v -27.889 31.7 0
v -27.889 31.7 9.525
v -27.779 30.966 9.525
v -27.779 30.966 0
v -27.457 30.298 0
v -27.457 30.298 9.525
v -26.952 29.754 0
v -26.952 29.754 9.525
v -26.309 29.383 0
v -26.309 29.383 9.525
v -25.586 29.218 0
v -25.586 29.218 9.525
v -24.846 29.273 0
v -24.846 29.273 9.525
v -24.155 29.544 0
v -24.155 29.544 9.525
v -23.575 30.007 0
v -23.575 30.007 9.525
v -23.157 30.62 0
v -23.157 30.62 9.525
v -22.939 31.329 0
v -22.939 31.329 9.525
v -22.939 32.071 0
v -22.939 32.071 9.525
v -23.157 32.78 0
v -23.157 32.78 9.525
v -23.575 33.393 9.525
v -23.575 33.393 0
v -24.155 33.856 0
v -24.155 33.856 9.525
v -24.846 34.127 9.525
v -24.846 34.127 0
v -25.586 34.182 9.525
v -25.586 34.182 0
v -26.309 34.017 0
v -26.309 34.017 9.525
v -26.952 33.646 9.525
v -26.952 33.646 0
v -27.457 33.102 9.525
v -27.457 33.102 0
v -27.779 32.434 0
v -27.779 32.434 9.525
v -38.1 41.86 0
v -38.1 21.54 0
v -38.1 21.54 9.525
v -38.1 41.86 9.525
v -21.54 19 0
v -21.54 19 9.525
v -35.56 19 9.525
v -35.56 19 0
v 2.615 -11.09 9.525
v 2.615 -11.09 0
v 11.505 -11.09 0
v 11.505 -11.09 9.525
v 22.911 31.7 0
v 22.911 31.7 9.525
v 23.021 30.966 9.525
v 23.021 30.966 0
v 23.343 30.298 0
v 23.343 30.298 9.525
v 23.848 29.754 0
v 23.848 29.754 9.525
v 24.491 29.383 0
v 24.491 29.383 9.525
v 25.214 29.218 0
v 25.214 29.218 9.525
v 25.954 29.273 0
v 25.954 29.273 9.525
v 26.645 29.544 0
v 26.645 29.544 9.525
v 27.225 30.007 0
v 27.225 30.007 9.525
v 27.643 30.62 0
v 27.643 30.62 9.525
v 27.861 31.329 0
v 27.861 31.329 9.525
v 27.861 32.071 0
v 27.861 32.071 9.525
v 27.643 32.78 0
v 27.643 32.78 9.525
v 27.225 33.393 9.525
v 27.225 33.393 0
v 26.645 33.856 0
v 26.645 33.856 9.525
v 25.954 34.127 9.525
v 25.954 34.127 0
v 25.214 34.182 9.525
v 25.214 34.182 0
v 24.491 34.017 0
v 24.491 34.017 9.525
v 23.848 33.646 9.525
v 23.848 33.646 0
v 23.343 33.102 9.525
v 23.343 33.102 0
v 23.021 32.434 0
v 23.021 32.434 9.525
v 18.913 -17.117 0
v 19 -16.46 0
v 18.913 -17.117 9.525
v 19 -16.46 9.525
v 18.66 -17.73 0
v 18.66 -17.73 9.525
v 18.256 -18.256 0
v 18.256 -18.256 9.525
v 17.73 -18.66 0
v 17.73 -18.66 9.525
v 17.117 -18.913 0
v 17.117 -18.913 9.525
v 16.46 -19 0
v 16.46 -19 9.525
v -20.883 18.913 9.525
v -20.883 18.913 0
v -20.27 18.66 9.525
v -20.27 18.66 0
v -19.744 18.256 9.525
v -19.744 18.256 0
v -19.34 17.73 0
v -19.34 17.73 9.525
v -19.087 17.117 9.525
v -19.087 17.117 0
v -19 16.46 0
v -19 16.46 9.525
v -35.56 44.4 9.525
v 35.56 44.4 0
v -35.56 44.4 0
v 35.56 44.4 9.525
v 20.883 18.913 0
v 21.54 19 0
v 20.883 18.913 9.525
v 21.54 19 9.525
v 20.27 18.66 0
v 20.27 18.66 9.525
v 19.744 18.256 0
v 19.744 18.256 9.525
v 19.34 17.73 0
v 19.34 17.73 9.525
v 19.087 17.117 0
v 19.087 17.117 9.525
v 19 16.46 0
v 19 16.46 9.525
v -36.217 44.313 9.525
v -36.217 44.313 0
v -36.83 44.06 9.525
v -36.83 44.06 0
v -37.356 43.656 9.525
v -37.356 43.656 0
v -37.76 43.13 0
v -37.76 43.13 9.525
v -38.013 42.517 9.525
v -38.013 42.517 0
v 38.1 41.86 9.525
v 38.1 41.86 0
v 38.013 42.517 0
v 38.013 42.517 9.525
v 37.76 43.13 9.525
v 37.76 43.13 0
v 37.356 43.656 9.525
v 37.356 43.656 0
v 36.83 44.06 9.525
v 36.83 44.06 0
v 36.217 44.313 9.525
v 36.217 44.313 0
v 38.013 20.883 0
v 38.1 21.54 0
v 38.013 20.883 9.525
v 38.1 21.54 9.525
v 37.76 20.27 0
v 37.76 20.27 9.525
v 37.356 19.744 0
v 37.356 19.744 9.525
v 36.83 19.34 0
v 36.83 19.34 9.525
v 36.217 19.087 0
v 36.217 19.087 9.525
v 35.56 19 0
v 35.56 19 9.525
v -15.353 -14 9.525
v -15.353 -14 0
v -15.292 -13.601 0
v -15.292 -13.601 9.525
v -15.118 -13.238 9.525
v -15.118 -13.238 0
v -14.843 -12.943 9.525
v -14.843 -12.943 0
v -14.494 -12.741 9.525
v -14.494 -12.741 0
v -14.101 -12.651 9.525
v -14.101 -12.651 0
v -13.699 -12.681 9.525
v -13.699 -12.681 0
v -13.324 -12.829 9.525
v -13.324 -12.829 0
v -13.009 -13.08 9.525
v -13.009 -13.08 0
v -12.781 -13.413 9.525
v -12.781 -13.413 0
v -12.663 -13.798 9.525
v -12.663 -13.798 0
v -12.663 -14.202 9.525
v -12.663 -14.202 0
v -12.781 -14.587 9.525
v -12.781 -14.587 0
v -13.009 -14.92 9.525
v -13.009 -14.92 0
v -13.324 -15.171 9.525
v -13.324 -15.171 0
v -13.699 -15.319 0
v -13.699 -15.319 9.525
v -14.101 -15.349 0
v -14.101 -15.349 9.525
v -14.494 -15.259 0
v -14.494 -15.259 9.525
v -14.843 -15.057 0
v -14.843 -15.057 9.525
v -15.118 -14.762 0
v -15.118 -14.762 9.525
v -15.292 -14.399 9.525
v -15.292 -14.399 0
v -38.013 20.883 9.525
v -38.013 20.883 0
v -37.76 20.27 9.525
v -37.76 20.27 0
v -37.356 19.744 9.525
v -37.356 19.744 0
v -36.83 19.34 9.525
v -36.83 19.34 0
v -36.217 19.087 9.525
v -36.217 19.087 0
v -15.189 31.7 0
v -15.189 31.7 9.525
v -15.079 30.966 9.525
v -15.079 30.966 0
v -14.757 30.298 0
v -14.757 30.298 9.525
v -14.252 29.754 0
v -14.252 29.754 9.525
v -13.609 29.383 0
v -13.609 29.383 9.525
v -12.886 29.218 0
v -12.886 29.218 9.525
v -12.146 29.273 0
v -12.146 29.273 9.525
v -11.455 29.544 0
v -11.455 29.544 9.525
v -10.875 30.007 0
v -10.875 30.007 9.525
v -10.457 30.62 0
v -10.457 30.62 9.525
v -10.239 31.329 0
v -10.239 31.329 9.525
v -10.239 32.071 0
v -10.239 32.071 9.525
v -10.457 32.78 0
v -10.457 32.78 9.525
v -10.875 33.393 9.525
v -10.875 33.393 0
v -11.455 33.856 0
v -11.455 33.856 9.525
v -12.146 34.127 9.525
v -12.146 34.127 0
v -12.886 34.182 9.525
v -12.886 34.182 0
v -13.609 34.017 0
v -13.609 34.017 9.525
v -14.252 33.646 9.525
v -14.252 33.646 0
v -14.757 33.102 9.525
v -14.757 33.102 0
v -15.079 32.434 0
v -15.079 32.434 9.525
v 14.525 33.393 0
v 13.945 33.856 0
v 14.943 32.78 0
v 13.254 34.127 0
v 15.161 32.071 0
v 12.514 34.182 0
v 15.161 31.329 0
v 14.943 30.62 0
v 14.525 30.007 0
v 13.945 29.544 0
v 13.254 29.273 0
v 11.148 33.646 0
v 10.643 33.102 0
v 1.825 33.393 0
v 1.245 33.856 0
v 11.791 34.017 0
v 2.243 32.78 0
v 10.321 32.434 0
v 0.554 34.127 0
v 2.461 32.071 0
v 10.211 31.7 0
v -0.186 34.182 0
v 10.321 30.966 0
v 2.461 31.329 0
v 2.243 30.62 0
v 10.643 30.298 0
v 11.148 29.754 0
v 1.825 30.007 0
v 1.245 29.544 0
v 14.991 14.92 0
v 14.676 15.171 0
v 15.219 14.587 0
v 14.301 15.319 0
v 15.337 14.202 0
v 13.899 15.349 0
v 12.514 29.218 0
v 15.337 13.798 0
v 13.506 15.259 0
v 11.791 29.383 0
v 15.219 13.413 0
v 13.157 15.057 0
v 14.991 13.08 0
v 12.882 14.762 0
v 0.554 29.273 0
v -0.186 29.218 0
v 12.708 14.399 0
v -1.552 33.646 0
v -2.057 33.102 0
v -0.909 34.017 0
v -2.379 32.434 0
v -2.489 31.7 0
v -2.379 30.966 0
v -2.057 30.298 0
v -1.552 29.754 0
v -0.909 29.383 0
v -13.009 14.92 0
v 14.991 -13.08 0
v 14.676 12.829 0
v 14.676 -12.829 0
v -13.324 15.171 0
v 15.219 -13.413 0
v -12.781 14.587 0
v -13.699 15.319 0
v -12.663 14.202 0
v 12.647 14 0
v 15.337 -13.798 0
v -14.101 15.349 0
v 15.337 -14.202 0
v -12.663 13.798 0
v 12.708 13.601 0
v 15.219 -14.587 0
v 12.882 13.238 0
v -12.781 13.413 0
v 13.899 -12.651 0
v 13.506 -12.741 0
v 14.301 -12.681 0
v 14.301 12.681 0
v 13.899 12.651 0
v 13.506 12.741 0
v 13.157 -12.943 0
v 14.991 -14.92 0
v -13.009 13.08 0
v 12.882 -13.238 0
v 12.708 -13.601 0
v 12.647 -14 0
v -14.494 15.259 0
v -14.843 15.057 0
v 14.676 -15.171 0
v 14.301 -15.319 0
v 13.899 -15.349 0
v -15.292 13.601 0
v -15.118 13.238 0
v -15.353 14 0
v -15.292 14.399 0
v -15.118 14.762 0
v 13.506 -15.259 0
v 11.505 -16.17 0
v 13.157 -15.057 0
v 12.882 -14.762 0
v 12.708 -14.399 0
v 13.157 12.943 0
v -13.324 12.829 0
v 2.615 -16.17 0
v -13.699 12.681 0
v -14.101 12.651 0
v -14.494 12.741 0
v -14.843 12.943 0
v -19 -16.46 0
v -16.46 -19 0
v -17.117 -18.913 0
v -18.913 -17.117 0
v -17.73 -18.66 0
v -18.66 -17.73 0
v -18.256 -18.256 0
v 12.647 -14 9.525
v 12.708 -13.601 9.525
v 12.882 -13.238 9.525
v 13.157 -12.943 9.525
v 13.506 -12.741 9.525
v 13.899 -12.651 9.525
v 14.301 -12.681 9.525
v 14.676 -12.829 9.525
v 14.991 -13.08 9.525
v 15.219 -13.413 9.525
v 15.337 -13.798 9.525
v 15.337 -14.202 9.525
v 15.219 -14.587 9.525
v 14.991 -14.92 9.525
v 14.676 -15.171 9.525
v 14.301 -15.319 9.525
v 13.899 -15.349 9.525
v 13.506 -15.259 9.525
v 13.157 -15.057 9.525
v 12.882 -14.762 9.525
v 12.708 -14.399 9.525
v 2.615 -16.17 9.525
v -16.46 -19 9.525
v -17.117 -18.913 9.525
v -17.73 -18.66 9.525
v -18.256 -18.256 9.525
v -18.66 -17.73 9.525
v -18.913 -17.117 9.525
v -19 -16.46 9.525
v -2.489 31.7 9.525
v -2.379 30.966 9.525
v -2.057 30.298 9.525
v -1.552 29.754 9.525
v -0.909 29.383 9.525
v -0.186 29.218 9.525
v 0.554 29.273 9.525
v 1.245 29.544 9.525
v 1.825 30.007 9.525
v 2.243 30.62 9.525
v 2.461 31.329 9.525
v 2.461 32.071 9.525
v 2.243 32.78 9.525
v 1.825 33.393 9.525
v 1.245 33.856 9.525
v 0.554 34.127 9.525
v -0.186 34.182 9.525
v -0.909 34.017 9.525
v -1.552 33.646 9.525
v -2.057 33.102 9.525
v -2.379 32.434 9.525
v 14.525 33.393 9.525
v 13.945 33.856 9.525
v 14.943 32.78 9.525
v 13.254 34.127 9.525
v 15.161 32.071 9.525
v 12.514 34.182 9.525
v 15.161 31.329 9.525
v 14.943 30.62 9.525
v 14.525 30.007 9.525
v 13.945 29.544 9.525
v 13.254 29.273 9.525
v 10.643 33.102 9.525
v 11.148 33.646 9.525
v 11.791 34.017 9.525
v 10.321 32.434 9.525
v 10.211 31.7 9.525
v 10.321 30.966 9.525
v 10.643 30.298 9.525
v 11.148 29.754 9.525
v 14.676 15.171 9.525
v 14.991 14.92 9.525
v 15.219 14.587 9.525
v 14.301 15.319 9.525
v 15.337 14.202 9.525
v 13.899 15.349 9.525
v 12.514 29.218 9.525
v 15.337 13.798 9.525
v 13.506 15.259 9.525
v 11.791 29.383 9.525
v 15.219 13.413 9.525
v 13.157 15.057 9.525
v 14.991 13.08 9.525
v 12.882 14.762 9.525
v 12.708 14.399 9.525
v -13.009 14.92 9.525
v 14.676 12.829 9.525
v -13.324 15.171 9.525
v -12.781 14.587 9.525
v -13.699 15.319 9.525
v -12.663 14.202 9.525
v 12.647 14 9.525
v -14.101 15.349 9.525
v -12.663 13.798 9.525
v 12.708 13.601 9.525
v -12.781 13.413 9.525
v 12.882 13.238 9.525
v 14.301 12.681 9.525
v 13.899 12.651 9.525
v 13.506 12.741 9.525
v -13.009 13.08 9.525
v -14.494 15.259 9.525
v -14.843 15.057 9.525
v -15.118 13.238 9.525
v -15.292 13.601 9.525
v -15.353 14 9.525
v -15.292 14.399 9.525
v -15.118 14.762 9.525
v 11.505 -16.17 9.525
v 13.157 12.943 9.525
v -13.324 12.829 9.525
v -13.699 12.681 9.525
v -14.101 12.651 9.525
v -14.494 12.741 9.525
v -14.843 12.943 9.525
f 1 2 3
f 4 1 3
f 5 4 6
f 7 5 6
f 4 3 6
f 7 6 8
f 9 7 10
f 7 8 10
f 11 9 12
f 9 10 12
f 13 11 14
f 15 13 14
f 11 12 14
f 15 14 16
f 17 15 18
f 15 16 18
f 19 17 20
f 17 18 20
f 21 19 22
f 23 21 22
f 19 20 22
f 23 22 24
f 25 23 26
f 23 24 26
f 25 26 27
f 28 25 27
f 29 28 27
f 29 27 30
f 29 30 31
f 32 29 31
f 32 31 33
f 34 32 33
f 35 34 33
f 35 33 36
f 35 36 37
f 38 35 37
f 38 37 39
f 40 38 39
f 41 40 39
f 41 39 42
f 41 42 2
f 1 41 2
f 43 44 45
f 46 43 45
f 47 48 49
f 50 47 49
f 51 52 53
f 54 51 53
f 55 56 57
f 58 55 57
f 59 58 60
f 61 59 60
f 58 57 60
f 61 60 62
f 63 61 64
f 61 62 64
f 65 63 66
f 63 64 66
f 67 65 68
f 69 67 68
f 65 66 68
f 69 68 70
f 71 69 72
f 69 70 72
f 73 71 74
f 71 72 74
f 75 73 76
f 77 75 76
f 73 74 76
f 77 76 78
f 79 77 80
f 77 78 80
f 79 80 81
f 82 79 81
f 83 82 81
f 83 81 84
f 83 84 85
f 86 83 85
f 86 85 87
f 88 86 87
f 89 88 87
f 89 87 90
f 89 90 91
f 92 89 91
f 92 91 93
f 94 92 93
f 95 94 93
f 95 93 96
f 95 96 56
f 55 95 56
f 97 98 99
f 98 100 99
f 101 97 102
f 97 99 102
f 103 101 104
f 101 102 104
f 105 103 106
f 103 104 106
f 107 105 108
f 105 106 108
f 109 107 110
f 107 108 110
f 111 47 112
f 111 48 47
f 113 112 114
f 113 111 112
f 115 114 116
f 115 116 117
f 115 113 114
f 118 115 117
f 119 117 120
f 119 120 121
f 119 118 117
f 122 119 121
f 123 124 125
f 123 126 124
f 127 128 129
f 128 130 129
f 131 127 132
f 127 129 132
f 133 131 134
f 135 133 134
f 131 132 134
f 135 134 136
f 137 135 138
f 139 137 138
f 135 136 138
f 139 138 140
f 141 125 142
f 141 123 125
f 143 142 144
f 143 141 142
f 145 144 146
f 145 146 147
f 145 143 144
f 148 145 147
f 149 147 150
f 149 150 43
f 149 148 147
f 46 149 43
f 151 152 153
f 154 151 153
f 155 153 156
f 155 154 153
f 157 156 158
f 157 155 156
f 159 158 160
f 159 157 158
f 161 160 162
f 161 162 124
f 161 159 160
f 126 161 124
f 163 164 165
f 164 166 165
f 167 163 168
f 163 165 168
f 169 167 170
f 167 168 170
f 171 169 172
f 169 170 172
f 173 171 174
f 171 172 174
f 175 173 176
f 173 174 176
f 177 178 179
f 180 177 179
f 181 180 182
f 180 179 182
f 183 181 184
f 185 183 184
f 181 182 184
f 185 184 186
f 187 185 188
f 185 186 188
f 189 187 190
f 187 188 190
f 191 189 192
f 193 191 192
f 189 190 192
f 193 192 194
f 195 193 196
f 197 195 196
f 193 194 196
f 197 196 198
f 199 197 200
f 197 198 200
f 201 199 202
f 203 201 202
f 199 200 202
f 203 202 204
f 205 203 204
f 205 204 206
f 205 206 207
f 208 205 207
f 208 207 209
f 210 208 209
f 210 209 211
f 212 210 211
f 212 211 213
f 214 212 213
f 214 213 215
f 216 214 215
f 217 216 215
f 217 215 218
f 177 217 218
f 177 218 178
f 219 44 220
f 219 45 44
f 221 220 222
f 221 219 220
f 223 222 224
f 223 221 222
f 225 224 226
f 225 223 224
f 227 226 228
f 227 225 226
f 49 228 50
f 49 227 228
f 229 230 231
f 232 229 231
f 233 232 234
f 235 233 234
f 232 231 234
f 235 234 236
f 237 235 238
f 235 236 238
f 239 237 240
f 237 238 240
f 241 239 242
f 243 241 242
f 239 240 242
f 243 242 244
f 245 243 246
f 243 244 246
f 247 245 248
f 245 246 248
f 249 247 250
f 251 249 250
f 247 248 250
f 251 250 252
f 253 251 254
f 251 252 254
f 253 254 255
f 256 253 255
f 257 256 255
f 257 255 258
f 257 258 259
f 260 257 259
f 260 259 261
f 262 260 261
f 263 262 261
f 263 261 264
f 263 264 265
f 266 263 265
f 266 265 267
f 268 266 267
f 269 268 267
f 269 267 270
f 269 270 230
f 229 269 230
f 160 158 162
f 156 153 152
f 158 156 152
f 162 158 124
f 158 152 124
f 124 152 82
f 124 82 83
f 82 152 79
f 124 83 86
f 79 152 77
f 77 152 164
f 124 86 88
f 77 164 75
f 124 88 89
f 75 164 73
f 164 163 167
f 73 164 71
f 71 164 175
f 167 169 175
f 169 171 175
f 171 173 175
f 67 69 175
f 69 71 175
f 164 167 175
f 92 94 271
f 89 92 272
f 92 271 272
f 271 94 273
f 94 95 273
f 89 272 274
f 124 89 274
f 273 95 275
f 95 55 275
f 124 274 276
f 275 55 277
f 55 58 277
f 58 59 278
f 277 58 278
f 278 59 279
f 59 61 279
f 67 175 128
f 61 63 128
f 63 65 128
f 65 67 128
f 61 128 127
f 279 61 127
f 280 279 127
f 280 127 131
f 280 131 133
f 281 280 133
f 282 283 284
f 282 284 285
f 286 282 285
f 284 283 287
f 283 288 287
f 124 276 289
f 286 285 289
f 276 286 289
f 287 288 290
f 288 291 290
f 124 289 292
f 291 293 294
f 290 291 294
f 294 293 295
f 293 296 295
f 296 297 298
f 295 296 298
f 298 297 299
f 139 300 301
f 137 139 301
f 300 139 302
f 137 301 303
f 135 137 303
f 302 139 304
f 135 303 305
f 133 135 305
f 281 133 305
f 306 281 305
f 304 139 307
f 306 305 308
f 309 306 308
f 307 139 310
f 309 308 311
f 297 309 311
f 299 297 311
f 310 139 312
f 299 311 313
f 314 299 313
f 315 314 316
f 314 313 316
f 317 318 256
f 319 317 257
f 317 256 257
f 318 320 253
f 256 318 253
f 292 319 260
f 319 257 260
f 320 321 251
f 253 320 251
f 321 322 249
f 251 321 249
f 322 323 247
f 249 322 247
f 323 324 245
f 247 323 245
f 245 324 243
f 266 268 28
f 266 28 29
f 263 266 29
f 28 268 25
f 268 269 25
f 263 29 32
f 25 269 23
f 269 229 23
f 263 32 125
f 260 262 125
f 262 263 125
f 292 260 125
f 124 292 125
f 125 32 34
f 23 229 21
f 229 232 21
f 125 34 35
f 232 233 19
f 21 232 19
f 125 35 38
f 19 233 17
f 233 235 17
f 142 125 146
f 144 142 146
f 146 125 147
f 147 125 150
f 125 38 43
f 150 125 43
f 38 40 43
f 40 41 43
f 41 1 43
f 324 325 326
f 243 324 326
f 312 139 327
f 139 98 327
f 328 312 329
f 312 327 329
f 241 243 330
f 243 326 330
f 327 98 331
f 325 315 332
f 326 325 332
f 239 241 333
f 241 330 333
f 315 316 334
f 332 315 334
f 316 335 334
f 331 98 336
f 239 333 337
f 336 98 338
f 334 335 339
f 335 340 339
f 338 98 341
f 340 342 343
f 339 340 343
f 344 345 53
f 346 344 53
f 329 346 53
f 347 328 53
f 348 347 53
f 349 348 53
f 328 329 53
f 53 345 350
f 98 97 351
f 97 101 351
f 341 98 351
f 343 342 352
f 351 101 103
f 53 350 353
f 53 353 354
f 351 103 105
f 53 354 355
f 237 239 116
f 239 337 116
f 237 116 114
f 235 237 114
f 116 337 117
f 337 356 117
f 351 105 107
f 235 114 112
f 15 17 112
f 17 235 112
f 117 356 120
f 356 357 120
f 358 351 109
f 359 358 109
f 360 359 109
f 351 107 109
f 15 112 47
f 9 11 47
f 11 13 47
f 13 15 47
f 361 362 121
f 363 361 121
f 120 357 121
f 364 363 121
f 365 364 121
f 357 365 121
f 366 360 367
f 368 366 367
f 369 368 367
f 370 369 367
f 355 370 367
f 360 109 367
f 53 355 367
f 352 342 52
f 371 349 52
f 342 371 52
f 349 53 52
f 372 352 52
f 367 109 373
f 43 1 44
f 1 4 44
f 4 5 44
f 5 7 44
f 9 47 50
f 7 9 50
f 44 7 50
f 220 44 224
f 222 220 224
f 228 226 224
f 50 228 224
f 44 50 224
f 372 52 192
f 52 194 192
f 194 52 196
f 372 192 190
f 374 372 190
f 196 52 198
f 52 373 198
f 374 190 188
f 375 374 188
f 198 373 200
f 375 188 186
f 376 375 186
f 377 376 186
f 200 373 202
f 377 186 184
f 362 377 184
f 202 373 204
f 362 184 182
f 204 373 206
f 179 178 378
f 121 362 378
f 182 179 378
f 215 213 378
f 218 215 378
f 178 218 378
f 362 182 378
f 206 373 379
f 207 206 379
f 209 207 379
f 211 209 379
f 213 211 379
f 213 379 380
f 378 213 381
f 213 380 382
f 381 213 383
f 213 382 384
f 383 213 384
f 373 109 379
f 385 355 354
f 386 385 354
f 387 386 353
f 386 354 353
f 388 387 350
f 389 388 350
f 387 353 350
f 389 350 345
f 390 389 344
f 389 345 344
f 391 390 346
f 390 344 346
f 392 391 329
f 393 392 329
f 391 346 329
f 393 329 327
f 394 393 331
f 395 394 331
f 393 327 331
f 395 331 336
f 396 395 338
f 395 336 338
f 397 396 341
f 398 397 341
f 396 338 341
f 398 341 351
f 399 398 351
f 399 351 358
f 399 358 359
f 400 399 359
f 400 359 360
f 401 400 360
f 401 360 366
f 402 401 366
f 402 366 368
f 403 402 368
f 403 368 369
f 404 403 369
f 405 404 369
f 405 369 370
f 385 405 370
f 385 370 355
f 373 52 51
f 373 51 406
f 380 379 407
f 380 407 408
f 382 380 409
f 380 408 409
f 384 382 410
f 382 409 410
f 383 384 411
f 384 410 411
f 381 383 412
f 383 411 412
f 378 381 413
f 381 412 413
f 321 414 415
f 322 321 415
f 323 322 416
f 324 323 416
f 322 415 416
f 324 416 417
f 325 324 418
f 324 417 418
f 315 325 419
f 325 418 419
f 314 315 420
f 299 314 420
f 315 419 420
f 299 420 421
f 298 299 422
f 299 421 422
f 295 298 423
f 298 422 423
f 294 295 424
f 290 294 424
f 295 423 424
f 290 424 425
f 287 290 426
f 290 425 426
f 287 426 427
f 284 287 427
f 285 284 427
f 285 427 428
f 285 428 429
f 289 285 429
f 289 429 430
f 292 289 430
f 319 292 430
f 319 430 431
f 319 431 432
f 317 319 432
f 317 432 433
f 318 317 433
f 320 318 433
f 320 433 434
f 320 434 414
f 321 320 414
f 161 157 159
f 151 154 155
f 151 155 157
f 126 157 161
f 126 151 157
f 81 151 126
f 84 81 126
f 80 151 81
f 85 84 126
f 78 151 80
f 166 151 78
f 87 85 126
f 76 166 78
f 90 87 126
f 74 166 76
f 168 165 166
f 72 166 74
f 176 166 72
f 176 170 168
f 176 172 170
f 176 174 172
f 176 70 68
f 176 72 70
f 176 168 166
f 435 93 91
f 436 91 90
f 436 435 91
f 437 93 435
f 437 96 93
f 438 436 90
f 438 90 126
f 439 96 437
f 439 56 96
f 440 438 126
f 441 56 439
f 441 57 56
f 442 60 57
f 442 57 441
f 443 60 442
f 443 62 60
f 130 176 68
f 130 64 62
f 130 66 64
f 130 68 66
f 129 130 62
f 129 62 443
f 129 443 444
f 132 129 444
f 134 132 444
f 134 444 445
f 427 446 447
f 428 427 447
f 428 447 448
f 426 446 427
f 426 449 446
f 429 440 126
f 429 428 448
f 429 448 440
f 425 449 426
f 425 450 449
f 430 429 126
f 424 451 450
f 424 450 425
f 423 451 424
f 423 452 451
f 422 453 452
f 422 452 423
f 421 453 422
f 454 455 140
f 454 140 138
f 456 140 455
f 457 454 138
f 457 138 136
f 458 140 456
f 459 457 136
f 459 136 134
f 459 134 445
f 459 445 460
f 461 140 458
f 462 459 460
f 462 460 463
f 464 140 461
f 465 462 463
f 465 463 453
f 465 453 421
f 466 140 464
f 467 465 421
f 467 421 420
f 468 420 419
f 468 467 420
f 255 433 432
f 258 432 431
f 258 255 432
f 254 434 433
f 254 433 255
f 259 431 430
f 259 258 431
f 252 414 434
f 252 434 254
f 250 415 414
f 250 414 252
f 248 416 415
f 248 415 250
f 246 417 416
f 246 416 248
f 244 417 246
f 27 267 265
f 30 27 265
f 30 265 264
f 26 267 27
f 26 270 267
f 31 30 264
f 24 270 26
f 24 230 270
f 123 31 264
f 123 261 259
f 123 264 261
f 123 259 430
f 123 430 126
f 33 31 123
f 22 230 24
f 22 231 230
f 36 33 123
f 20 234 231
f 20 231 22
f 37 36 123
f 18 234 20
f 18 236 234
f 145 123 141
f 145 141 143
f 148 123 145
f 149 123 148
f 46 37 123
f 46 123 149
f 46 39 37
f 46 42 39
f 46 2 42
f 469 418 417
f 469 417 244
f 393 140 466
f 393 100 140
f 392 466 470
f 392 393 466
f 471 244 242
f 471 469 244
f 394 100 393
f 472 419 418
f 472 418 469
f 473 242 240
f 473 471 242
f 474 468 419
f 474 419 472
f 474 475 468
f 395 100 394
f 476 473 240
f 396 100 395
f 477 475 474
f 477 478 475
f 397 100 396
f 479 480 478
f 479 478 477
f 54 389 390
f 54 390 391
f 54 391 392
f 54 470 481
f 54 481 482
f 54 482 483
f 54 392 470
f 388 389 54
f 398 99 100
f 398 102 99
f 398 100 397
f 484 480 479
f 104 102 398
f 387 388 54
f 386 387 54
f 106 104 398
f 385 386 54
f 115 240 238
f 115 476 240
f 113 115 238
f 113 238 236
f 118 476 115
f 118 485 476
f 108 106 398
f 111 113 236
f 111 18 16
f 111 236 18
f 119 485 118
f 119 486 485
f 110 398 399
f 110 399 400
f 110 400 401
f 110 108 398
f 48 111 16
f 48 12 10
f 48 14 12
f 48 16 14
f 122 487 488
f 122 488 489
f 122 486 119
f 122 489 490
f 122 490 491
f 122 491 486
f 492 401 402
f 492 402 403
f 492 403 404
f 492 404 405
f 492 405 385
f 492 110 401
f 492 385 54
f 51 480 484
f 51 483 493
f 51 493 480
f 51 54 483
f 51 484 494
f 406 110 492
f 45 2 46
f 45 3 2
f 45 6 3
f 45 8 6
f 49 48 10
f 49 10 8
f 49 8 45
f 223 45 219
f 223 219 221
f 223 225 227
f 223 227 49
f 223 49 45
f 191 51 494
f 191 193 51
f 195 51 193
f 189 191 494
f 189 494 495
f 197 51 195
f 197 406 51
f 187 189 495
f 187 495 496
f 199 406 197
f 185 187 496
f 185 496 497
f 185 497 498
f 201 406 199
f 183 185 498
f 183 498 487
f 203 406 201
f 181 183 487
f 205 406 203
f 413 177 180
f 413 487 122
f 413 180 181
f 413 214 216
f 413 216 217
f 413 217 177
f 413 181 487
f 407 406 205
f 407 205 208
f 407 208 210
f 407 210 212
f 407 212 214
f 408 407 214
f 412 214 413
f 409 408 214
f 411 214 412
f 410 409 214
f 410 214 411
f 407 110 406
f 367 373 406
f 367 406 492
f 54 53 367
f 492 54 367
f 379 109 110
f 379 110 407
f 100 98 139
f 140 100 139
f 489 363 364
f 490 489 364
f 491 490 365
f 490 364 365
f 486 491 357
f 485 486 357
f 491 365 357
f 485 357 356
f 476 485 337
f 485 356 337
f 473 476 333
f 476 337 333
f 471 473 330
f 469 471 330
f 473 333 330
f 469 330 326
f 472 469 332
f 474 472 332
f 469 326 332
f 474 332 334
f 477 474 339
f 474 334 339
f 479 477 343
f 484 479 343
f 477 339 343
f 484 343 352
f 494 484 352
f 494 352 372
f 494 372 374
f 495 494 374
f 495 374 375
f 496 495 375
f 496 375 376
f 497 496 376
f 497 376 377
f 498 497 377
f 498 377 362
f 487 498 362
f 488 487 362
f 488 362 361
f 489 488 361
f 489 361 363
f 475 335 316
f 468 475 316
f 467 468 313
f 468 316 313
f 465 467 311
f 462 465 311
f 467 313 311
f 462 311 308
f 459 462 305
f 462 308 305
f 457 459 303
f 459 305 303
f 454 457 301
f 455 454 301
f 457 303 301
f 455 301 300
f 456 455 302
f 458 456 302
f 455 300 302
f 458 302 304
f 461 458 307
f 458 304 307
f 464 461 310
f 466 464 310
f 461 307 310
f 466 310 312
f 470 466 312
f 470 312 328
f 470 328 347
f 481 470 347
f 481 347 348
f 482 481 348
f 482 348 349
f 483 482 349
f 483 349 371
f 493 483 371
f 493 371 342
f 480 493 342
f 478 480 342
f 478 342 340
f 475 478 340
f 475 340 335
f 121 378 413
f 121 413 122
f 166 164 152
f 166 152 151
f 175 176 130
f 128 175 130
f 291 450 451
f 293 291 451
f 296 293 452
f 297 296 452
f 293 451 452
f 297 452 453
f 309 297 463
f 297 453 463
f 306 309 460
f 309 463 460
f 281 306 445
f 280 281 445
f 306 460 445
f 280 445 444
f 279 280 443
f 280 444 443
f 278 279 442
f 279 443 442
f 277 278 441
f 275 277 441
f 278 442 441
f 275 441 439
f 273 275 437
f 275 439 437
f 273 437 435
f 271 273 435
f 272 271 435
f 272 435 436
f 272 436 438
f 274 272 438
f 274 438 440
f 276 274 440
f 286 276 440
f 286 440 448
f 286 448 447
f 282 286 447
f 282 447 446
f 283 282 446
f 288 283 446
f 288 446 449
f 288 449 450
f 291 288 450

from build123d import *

# Parameters (mm, degrees)
SKETCH1_W                    = 38
SKETCH1_H                    = 38
BOSS_EXTRUDE1_DEPTH          = 9.525
F_36_0_1065_DIAMETER_HOLE2_D = 2.7051
SKETCH7_W                    = 8.89
SKETCH7_H                    = 5.08
CUT_EXTRUDE1_DEPTH           = 29.508343077
SKETCH8_W                    = 76.2
SKETCH8_H                    = 9.525
BOSS_EXTRUDE2_DEPTH          = 25.4
F_9_0_196_DIAMETER_HOLE1_D   = 4.9784
FILLET1_R                    = 2.54


with BuildPart() as part:
    # Sketch1 → Boss-Extrude1 (new body)
    with BuildSketch(Plane(origin=(0, 0, 0), x_dir=(0, 1, 0), z_dir=(0, 0, 1))):
        Rectangle(SKETCH1_W, SKETCH1_H)
    extrude(amount=BOSS_EXTRUDE1_DEPTH)

    # #36 (0.1065) Diameter Hole2 (through all)
    with Locations(Plane.XY.offset(9.525)):
        with Locations((-14, -14), (14, -14), (14, 14), (-14, 14)):
            Hole(F_36_0_1065_DIAMETER_HOLE2_D / 2)

    # Sketch7 → Cut-Extrude1 (cut, through all)
    with BuildSketch(Plane(origin=(0, 0, 0), x_dir=(1, 0, 0), z_dir=(0, 0, -1))):
        with Locations((7.05999991, 13.629999978)):
            Rectangle(SKETCH7_W, SKETCH7_H)
    extrude(amount=-CUT_EXTRUDE1_DEPTH, mode=Mode.SUBTRACT)

    # Sketch8 → Boss-Extrude2 (add)
    with BuildSketch(Plane(origin=(0, 19, 0), x_dir=(-1, 0, 0), z_dir=(0, 1, 0))):
        with Locations((0, 4.7625)):
            Rectangle(SKETCH8_W, SKETCH8_H)
    extrude(amount=BOSS_EXTRUDE2_DEPTH)

    # #9 (0.196) Diameter Hole1 (through all)
    with Locations(Plane(origin=(0, 0, 0), x_dir=(1, 0, 0), z_dir=(0, 0, -1))):
        with Locations((-25.4, -31.7), (-12.7, -31.7), (0, -31.7), (12.7, -31.7), (25.4, -31.7)):
            Hole(F_9_0_196_DIAMETER_HOLE1_D / 2)

    # Fillet1
    fillet1_edges = [part.edges().sort_by_distance(p)[0] for p in [
        (-38.1, 19, 4.7625),
        (38.1, 19, 4.7625),
        (-38.1, 44.4, 4.7625),
        (38.1, 44.4, 4.7625),
        (19, 19, 4.7625),
        (19, -19, 4.7625),
        (-19, -19, 4.7625),
        (-19, 19, 4.7625),
    ]]
    fillet(fillet1_edges, radius=FILLET1_R)


solid = part.part
